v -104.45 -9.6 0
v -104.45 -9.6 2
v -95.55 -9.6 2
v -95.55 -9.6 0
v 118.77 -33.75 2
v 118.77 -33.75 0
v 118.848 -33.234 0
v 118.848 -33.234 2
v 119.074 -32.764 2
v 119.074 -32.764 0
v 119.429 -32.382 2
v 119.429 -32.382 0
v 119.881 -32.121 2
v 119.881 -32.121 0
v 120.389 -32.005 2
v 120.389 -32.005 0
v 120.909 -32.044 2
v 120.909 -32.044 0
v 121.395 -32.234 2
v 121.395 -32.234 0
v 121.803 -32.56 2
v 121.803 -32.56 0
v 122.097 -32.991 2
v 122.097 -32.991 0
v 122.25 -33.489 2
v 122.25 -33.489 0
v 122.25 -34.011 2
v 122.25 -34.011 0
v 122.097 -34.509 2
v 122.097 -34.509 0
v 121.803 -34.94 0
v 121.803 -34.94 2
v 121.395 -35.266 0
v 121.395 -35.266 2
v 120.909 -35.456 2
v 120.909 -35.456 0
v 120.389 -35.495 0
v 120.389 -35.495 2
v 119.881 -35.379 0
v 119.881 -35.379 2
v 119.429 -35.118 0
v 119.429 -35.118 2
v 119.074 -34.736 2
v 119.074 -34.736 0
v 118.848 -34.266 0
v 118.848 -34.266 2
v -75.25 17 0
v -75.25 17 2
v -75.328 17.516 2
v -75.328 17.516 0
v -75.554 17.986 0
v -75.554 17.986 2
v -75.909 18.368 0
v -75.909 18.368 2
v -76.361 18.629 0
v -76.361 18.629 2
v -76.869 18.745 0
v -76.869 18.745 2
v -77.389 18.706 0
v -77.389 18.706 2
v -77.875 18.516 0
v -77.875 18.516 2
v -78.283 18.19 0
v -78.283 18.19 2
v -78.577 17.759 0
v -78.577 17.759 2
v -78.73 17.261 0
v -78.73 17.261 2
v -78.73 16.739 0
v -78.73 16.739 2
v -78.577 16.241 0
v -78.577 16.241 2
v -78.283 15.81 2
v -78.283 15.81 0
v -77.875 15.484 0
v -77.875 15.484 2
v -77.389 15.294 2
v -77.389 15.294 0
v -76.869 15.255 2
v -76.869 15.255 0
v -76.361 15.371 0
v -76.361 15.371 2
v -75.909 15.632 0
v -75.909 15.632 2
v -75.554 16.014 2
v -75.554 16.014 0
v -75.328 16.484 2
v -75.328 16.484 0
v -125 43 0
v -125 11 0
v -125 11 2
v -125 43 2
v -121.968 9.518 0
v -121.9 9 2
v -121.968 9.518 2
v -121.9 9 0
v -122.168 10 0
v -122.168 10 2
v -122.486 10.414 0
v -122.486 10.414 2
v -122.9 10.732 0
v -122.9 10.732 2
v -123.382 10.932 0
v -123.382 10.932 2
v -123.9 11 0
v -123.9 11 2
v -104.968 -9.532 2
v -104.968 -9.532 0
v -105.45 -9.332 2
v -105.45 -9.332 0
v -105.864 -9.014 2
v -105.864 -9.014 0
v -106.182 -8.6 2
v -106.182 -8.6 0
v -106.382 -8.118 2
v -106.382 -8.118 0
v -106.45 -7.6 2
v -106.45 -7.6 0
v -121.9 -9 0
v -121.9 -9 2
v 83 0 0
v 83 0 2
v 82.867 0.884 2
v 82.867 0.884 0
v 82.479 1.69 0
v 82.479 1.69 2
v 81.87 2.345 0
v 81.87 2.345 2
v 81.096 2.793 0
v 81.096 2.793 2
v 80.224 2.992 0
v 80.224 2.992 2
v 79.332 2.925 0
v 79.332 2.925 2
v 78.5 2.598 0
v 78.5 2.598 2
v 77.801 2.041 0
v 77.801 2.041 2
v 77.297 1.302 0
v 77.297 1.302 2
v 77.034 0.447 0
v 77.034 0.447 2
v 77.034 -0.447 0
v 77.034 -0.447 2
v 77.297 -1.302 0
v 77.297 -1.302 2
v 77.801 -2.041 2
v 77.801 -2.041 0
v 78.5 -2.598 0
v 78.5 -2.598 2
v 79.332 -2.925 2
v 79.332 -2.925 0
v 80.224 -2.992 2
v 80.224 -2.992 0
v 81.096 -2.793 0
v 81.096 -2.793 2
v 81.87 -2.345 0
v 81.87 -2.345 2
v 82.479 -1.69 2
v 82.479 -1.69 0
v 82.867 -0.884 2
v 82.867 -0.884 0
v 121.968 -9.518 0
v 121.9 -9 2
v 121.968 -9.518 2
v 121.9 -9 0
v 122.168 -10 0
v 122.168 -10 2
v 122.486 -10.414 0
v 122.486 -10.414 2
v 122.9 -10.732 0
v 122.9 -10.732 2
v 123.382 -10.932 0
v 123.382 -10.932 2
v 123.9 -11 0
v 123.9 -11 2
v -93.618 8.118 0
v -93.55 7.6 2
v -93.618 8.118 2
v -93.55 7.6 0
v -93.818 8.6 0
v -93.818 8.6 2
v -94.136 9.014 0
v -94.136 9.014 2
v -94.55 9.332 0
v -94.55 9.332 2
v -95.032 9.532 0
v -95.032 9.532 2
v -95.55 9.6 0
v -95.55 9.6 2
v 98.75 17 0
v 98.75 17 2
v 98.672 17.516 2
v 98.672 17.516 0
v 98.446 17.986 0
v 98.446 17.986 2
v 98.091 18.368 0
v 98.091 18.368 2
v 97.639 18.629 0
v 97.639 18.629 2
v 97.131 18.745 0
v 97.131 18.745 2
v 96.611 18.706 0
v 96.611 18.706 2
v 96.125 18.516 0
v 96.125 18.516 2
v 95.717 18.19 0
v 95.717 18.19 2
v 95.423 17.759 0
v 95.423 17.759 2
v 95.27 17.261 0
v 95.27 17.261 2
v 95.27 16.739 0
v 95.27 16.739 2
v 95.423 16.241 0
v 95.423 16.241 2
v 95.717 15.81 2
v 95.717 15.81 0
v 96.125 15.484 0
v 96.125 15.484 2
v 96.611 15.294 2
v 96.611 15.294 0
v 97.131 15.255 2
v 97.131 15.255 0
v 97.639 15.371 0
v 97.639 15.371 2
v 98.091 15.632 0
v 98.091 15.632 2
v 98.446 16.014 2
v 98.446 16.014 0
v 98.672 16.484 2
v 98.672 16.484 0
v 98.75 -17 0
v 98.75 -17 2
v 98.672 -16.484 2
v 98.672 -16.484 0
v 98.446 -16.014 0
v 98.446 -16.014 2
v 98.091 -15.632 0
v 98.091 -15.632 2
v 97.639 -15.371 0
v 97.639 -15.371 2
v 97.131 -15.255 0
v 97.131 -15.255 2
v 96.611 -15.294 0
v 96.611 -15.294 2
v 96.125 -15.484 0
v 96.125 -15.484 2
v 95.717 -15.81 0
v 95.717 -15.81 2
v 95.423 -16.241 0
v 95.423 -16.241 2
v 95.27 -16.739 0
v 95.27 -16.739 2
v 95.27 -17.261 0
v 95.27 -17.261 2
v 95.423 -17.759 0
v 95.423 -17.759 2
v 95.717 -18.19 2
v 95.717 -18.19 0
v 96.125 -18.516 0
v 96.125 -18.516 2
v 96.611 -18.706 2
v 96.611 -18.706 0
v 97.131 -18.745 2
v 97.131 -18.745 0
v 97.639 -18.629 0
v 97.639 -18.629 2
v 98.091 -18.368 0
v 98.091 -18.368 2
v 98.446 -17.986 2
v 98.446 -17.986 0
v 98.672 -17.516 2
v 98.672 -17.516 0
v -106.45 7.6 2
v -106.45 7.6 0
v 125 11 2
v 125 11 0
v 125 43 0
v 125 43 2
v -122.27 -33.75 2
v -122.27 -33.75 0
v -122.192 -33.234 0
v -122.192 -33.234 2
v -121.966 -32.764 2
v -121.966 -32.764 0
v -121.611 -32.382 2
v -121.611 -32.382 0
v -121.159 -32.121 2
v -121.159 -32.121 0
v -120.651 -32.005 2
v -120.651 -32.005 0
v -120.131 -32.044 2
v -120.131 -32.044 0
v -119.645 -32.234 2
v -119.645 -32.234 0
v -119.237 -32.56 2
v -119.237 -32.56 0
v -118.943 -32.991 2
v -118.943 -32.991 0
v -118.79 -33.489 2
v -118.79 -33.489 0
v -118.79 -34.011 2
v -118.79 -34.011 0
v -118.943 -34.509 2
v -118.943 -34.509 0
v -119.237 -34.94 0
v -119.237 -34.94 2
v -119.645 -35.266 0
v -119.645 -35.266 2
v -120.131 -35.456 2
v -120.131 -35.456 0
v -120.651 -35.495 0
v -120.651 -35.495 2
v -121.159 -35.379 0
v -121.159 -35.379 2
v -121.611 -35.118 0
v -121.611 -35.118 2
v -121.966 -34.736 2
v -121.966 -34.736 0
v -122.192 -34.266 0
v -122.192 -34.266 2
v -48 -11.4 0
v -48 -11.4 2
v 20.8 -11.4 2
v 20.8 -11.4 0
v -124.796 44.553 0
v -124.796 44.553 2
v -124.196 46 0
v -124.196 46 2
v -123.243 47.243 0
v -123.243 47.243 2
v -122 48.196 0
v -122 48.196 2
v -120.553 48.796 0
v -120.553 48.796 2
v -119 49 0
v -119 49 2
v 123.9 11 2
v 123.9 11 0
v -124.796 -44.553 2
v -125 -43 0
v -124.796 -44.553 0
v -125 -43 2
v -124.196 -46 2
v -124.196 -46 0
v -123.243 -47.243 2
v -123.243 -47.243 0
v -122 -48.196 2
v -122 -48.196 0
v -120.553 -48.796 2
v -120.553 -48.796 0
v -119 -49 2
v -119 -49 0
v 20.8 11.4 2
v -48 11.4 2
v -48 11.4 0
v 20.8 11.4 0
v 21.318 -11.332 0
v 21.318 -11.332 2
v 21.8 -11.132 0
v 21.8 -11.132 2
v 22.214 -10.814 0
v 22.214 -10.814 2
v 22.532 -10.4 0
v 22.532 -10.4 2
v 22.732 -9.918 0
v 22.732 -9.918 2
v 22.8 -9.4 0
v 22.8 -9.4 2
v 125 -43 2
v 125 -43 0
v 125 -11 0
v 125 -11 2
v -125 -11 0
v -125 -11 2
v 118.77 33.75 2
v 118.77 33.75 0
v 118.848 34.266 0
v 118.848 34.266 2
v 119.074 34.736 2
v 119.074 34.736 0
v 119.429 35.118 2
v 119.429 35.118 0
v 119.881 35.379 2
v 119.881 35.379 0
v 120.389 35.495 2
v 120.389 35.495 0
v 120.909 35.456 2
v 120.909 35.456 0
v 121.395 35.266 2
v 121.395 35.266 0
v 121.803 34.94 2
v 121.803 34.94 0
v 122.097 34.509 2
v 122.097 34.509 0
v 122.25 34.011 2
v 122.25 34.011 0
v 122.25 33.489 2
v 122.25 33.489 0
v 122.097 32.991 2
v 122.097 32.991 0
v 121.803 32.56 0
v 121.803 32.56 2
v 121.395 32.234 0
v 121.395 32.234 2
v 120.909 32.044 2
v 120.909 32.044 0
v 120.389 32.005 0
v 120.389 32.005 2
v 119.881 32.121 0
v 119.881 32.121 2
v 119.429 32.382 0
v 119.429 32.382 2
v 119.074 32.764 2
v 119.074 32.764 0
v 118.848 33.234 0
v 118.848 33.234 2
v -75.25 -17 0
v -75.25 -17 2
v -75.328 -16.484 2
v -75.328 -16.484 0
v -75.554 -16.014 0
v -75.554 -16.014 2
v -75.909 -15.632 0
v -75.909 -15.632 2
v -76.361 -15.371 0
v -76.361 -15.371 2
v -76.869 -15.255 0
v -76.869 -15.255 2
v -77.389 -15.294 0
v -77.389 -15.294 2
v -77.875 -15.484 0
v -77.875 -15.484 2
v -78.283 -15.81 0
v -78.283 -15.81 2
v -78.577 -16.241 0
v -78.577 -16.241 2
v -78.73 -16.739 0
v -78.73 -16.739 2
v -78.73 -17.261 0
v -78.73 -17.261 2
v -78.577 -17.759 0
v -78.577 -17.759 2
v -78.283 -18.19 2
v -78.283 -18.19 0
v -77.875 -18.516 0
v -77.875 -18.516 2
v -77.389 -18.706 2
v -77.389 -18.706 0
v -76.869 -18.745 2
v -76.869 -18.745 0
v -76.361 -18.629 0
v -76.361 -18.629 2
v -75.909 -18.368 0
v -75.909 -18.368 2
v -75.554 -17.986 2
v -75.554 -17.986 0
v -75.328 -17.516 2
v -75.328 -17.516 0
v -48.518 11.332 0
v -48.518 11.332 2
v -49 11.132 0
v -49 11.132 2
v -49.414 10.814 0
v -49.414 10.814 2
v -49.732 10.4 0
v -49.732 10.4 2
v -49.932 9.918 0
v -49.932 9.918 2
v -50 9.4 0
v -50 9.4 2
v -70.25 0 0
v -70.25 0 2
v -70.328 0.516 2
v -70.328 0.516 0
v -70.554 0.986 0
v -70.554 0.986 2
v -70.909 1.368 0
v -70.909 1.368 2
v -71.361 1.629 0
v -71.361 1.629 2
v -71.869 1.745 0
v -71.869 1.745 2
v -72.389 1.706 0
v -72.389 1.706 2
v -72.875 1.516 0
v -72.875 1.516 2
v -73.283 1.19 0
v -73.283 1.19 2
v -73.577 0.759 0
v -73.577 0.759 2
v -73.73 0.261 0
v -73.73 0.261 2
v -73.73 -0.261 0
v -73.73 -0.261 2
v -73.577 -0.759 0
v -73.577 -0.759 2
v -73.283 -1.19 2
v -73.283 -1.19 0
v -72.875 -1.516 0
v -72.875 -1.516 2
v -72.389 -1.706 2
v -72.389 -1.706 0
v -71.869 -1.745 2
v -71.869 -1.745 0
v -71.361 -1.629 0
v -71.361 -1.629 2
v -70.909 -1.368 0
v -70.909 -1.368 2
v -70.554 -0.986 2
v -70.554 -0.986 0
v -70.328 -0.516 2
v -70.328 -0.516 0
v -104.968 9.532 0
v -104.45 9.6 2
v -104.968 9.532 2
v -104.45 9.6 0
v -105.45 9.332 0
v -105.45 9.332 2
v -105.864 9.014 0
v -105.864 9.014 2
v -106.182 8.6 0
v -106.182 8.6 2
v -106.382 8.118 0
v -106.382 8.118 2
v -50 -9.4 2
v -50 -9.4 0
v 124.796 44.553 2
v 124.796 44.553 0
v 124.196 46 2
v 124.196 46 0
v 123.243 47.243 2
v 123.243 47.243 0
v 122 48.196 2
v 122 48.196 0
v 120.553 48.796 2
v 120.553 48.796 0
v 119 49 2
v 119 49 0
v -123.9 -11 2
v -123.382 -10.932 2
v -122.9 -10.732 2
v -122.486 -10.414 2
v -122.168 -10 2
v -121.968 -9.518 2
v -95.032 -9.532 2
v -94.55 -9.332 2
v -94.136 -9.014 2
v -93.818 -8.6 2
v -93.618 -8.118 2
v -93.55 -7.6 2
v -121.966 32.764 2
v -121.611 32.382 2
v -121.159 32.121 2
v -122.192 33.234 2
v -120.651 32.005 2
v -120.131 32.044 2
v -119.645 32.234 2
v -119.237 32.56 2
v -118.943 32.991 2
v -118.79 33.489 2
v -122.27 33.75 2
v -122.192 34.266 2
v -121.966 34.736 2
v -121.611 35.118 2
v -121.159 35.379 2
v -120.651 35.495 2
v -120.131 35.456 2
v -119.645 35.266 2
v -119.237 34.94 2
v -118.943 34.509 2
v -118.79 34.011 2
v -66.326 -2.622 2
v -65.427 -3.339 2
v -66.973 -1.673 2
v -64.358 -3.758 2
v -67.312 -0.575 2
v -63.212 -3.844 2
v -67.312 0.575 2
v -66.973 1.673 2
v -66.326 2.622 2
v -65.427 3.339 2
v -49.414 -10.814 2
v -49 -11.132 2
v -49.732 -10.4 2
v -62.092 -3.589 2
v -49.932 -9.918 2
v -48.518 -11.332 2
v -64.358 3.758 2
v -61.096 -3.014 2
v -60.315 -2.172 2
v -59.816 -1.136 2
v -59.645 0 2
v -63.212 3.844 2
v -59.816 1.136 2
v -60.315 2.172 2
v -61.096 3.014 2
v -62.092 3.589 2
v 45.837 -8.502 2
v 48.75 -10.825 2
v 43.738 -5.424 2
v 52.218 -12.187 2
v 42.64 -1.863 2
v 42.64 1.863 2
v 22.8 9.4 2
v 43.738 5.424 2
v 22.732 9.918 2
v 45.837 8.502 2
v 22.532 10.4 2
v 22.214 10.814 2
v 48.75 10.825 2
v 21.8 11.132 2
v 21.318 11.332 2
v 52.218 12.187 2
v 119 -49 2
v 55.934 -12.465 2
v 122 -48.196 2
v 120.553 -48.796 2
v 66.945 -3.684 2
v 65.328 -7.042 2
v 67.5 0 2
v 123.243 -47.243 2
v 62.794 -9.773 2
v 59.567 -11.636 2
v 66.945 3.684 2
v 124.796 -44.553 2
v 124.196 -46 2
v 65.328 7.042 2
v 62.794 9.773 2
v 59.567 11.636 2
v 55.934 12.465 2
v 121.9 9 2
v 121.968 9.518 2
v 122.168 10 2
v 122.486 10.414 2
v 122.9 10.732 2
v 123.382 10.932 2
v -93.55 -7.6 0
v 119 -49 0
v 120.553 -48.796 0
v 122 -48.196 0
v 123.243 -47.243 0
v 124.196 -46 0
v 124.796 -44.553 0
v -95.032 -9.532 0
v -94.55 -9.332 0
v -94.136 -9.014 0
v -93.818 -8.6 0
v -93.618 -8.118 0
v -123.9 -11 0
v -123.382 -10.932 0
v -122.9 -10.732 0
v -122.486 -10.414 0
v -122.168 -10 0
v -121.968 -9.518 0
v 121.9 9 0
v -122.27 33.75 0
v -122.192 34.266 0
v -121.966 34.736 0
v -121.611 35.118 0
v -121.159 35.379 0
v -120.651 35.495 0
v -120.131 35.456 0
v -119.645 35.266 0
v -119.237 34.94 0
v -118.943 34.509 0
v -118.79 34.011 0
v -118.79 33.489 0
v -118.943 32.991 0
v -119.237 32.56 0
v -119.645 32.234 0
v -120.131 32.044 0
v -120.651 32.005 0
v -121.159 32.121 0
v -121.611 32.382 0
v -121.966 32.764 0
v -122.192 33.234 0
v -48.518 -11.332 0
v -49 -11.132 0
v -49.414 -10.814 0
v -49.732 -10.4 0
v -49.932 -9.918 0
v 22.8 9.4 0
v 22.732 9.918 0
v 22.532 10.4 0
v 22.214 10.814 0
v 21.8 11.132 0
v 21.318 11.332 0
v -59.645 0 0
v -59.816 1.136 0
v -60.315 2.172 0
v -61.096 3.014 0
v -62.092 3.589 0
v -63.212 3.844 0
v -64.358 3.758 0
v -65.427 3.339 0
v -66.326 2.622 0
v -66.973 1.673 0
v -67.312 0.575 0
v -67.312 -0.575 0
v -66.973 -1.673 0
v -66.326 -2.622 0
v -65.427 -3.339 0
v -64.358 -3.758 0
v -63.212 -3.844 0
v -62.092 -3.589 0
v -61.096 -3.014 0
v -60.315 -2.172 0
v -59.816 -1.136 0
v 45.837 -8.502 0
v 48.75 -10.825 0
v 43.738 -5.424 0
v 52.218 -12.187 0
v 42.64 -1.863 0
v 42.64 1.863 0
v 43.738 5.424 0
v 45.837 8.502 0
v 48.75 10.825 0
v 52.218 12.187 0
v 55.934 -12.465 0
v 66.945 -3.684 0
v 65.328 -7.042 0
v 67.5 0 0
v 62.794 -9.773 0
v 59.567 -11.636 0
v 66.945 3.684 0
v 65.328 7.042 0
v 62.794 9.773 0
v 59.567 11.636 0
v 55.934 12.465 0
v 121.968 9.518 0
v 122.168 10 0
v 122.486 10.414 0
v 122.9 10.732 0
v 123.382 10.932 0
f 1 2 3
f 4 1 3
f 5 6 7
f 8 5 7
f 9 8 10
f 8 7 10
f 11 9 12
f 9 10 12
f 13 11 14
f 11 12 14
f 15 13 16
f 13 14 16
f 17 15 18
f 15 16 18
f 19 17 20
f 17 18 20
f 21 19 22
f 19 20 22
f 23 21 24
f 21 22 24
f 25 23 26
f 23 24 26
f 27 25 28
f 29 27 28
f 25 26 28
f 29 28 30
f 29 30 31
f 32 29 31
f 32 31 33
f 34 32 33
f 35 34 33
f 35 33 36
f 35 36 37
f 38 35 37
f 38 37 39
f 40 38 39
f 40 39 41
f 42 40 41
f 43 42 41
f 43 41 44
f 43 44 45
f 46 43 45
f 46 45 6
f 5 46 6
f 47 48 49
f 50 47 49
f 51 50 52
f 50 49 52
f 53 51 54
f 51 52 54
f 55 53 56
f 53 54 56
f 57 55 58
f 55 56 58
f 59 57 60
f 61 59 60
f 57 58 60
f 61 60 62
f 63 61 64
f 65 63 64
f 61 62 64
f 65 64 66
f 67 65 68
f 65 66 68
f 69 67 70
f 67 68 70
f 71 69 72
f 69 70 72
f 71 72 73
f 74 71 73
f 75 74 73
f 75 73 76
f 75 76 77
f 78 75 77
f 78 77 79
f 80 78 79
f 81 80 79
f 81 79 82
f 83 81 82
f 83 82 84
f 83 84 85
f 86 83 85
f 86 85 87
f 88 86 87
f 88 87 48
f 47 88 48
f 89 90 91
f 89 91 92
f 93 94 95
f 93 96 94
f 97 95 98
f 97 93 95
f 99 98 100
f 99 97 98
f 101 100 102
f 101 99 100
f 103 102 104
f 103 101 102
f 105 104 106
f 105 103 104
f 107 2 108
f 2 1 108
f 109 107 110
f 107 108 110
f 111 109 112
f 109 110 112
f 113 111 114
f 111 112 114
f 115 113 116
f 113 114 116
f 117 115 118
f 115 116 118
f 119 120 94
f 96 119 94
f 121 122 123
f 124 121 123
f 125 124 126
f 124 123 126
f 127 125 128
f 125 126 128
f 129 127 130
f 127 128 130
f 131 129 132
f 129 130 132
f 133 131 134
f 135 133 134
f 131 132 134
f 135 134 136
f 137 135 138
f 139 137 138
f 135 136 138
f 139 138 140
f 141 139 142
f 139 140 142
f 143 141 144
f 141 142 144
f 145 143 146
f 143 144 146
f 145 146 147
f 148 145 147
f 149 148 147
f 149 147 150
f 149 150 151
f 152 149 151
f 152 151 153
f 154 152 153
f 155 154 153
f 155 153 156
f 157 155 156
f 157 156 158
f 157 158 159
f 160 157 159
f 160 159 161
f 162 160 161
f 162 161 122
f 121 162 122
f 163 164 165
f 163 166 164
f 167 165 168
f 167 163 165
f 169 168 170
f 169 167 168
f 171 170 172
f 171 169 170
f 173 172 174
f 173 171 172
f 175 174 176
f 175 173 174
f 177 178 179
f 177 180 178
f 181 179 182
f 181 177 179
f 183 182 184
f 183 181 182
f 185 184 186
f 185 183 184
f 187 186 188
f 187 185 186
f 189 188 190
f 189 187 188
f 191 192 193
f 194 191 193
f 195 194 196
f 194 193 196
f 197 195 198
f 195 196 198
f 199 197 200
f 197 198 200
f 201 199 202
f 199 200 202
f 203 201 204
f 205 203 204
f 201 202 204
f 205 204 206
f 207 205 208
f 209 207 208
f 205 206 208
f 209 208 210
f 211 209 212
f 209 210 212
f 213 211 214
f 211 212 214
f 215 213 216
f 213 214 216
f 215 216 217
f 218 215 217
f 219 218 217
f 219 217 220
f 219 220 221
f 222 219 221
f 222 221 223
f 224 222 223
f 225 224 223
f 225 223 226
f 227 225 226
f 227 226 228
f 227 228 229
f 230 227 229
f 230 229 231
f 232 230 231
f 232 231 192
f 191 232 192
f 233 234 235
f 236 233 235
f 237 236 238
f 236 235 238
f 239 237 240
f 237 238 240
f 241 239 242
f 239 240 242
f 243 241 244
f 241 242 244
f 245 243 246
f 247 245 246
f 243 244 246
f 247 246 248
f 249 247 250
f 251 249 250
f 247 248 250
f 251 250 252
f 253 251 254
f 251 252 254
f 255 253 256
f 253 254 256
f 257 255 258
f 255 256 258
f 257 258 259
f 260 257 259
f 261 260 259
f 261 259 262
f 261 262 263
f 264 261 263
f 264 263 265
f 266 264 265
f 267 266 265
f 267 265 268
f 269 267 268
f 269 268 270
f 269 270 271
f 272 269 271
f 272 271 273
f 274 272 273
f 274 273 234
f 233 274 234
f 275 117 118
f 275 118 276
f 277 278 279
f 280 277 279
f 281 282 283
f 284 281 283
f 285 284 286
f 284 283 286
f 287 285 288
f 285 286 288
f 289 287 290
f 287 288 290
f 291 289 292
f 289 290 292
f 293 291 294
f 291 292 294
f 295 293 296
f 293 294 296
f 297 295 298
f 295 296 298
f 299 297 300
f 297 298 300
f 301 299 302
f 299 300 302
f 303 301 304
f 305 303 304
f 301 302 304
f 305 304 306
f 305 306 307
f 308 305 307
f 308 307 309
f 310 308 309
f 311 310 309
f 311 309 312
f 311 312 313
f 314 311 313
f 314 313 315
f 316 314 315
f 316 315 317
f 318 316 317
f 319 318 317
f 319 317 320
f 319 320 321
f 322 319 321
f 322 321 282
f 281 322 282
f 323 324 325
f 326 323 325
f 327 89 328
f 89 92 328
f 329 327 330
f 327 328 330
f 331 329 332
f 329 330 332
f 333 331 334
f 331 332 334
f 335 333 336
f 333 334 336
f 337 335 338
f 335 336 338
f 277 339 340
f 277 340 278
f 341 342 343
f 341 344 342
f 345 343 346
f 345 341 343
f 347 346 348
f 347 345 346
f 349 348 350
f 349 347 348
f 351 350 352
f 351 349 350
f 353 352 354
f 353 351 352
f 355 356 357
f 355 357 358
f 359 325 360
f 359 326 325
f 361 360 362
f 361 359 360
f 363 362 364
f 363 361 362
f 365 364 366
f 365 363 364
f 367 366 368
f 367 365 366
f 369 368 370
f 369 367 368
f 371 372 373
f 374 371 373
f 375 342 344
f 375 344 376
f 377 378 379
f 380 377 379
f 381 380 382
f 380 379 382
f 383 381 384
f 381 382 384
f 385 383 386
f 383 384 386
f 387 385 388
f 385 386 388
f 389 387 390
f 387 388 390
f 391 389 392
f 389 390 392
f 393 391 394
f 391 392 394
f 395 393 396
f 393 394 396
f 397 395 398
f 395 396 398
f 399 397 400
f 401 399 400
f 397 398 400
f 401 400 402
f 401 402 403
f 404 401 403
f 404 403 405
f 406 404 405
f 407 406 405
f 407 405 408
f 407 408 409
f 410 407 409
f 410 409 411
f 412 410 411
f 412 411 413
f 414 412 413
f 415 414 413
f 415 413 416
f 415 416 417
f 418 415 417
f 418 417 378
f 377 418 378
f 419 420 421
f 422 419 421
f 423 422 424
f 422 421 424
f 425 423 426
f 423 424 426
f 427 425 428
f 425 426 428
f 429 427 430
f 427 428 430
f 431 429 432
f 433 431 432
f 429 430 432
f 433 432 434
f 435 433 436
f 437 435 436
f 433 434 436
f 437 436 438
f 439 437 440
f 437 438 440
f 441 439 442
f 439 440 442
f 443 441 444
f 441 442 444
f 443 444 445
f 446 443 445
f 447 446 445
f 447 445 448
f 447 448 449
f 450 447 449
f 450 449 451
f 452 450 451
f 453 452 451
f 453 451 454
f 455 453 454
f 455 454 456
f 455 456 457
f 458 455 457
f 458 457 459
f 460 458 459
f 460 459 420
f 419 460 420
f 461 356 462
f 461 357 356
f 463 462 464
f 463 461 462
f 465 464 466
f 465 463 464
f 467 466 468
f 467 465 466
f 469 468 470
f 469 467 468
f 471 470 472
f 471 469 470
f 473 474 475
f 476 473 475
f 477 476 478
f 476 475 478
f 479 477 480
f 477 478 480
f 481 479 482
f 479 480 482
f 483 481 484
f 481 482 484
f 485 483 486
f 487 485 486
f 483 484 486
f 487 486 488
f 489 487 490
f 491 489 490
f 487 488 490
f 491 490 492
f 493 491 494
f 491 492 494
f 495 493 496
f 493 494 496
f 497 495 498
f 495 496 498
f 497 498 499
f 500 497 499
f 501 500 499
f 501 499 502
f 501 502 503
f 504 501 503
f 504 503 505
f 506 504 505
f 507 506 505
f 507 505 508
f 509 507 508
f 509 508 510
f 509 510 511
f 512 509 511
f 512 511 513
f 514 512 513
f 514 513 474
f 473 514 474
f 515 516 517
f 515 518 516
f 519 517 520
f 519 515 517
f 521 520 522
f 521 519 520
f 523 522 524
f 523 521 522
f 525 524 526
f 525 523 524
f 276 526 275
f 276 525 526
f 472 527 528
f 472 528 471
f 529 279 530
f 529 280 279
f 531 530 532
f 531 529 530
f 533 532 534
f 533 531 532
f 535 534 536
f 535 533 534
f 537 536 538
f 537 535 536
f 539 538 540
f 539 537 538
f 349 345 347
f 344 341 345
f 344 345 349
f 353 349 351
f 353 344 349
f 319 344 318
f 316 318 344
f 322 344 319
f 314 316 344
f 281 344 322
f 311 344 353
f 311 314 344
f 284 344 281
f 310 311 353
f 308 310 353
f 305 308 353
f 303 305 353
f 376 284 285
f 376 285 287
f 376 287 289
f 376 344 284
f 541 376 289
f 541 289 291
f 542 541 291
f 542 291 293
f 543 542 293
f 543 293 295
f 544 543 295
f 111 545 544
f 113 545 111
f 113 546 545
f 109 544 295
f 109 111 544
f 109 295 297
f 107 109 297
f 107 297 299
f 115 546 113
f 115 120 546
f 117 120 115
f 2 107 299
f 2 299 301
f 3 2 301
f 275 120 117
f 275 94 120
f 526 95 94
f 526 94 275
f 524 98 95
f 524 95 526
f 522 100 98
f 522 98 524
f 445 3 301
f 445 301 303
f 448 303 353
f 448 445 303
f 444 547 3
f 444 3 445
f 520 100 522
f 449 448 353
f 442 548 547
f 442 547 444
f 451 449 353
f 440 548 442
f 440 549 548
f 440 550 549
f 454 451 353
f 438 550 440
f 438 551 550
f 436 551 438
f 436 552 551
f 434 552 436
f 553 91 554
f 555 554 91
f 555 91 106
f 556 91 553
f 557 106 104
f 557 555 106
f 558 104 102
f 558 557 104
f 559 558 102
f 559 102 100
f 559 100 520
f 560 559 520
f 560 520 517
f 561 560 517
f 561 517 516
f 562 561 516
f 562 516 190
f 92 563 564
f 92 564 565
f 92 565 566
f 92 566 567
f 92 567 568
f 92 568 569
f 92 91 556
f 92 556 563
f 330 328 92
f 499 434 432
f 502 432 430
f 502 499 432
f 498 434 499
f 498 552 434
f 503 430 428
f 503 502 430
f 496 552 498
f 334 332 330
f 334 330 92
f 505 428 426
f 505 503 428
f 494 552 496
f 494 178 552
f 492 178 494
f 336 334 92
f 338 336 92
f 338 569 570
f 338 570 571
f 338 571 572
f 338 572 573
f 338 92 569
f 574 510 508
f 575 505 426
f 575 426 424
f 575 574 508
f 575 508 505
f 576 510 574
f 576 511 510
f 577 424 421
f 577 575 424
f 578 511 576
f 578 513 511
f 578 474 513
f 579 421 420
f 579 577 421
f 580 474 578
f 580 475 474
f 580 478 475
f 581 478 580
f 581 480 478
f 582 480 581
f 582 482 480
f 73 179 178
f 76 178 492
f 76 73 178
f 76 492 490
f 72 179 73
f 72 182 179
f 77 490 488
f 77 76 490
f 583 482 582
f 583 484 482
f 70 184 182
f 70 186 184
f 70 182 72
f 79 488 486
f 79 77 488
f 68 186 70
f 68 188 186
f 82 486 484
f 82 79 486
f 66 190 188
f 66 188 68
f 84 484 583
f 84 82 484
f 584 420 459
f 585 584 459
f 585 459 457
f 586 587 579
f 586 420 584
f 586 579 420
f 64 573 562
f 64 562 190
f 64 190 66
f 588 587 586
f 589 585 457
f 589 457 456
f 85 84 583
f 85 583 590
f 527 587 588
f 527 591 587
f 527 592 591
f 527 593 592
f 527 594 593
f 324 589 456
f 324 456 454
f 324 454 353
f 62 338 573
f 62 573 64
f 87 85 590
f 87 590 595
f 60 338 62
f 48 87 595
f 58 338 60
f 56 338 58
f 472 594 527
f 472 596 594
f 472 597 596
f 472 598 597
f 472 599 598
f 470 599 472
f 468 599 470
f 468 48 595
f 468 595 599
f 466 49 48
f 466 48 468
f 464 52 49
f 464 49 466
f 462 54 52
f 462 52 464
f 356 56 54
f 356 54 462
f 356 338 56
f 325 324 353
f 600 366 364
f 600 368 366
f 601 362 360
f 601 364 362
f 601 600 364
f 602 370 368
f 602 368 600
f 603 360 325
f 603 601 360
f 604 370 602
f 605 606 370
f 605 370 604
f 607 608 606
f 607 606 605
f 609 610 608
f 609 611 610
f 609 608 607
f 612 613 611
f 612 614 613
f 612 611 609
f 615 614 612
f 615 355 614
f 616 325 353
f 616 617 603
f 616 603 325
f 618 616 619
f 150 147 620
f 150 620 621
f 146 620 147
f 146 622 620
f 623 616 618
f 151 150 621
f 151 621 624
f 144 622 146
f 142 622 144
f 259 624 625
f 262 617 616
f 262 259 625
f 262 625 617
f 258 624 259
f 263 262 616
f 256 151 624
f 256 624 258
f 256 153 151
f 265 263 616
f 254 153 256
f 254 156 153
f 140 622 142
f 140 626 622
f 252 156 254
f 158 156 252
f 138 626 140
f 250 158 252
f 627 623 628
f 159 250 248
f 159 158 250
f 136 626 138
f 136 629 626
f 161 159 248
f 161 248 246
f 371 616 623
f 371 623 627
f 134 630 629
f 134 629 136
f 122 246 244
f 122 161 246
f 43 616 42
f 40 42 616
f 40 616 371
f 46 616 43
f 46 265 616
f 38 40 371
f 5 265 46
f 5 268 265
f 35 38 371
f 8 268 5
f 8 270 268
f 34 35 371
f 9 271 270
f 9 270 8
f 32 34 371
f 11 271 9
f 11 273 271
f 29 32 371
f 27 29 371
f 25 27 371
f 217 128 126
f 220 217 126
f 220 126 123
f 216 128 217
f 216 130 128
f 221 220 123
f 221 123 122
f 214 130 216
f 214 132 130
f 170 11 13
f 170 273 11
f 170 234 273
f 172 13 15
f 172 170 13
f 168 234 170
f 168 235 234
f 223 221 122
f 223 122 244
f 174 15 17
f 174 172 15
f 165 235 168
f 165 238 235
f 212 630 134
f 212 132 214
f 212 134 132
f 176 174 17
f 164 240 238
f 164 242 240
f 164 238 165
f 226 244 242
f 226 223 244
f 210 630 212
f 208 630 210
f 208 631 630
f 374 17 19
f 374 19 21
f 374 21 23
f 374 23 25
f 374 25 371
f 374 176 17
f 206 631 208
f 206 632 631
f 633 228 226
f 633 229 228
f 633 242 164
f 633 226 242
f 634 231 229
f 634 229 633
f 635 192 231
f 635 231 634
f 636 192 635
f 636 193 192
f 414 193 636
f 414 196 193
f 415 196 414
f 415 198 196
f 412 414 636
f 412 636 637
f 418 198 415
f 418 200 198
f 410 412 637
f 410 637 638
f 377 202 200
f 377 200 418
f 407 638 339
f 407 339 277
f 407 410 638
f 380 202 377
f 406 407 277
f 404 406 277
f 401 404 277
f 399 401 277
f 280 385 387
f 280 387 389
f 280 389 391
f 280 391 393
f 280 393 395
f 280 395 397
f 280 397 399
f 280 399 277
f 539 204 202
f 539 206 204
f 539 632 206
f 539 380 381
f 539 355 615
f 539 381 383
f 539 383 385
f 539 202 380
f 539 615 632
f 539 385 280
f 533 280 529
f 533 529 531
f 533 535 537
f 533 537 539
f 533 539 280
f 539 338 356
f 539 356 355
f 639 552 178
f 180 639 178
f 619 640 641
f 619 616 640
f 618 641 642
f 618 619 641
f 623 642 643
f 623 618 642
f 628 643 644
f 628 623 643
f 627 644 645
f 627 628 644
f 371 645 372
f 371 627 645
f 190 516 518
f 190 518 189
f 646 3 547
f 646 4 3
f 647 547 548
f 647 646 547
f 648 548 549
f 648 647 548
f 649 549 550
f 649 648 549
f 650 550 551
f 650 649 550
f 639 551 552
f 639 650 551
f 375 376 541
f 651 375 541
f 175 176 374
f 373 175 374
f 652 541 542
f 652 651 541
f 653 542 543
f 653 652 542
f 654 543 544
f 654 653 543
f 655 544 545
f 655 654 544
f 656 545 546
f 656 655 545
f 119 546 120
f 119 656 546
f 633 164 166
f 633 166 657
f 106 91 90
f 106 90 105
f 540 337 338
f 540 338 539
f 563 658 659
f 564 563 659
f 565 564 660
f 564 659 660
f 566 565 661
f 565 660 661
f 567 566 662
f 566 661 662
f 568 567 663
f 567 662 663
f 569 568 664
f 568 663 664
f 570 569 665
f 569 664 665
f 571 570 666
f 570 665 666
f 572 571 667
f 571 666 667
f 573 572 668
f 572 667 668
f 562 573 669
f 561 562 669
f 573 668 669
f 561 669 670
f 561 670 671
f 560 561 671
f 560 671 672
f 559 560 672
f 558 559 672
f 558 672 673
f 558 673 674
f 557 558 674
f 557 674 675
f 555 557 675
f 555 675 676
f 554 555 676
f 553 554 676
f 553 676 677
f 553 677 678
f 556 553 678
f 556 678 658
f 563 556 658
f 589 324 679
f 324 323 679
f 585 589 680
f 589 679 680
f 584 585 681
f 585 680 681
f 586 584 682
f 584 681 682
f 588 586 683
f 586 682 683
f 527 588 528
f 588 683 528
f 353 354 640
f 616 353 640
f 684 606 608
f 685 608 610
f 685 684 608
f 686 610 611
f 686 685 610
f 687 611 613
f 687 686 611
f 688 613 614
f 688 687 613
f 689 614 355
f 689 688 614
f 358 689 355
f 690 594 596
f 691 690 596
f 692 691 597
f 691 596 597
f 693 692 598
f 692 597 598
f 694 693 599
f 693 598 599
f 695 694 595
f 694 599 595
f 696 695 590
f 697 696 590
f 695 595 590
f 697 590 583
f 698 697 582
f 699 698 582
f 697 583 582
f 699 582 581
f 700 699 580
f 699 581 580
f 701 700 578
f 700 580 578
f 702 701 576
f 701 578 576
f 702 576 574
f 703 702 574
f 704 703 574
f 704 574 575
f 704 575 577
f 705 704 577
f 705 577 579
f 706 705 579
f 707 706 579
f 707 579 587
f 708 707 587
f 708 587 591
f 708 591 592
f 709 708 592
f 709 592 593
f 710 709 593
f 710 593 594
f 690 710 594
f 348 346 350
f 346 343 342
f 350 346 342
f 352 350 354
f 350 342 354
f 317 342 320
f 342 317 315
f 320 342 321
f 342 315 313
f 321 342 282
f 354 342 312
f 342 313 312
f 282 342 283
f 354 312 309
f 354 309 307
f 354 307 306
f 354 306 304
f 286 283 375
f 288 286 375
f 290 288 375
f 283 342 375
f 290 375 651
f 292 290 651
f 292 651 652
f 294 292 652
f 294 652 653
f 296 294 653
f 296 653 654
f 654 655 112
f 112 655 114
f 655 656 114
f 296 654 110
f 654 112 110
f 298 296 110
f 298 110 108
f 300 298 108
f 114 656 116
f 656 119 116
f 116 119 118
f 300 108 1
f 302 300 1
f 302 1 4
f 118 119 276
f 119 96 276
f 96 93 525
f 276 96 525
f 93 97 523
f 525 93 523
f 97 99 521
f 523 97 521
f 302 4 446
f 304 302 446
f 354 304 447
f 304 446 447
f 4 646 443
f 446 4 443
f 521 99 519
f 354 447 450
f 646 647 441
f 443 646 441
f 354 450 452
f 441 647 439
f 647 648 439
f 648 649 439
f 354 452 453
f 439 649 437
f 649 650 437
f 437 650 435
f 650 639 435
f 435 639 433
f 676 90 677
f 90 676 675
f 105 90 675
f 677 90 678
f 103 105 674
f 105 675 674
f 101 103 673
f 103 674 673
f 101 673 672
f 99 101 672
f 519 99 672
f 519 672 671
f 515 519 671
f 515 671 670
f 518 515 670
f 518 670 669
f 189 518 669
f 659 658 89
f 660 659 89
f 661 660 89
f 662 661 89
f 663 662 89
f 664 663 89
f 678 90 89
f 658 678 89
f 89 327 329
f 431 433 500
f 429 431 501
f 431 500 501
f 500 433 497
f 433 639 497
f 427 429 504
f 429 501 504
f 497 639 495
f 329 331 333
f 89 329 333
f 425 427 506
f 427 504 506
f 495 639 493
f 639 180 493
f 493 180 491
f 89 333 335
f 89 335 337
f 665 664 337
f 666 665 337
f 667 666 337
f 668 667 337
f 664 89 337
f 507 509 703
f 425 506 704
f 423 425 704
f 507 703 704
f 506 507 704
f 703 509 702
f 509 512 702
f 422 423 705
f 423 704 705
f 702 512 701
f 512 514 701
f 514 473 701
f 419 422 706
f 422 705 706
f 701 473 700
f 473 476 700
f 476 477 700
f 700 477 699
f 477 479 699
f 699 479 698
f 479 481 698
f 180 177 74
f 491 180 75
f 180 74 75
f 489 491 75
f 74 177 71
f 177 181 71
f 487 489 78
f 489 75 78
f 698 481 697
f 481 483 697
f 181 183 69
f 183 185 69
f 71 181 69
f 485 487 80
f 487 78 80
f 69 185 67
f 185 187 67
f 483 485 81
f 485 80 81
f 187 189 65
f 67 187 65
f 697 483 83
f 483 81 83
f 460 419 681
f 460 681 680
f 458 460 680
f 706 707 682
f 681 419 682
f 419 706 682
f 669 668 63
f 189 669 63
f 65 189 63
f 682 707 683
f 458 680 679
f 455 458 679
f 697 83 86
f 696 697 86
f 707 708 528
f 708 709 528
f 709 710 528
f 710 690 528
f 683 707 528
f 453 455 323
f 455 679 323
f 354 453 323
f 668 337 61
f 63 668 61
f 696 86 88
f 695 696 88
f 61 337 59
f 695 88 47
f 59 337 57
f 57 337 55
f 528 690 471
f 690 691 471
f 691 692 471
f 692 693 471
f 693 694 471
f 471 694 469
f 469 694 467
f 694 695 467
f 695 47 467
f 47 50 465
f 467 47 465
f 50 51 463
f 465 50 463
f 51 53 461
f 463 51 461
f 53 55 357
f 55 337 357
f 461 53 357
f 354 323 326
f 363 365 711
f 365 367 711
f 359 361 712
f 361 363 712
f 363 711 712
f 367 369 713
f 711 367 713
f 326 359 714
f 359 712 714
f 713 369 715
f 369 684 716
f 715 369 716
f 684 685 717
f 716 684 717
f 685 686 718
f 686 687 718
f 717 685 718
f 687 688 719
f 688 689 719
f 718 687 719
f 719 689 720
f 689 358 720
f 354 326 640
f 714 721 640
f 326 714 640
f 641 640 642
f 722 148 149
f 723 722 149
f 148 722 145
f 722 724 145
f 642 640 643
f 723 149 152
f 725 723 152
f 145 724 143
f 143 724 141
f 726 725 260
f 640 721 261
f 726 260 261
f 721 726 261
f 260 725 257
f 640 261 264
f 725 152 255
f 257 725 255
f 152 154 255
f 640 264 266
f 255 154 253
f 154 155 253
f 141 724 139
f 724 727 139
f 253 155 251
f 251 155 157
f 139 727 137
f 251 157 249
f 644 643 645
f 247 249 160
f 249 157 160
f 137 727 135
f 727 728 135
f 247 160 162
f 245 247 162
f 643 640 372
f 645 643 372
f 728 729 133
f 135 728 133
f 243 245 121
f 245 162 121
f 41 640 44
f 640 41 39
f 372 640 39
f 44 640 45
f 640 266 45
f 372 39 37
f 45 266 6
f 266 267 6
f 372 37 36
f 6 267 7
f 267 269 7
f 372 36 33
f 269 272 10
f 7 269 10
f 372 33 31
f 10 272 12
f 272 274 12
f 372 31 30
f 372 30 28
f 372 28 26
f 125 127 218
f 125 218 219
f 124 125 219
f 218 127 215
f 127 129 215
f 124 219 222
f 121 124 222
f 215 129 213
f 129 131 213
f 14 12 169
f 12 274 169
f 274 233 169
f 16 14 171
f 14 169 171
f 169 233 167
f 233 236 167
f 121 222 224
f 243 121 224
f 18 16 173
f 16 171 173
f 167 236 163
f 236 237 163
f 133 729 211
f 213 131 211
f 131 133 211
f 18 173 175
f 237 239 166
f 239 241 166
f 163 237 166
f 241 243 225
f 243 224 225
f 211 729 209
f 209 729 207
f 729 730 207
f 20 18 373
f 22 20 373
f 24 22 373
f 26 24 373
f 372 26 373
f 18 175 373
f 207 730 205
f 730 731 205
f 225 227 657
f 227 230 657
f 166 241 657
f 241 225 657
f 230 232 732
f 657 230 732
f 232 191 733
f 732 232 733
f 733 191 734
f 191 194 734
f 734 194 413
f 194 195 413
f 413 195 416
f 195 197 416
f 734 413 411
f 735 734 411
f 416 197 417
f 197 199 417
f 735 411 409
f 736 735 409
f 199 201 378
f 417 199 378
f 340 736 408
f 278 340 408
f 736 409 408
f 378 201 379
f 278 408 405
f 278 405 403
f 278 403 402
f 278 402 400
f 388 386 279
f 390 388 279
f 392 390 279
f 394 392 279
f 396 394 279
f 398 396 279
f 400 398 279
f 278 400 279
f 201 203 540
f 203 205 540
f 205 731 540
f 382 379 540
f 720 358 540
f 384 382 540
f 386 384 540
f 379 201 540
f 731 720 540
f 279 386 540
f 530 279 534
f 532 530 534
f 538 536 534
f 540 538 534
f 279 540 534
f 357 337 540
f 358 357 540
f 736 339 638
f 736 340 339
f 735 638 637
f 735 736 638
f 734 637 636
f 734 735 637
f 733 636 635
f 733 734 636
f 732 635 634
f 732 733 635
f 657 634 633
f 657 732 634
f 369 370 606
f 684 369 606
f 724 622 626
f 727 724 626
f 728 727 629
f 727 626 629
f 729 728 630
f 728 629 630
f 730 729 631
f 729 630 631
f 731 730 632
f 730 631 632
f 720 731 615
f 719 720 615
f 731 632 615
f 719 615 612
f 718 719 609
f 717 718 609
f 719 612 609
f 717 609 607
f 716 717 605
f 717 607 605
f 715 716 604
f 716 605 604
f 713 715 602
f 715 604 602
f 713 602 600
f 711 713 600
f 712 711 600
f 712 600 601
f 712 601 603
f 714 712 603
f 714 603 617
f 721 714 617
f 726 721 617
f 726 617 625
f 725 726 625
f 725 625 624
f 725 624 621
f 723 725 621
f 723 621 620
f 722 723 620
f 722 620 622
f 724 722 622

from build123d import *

# Parameters (mm, degrees)
SKETCH1_W                  = 250
SKETCH1_H                  = 98
BOSS_EXTRUDE1_DEPTH        = 2
FILLET1_R                  = 6
SKETCH2_W                  = 6.2
SKETCH2_H                  = 22
CUT_EXTRUDE1_DEPTH         = 12
FILLET2_R                  = 2
F_3_5_3_5_DIAMETER_HOLE1_D = 3.5
SKETCH6_R                  = 1.75
SKETCH6_R_2                = 3.855
SKETCH6_R_3                = 12.5
SKETCH6_R_4                = 3
SKETCH6_W                  = 72.8
SKETCH6_H                  = 22.8
SKETCH6_W_2                = 12.9
SKETCH6_H_2                = 19.2
CUT_EXTRUDE2_DEPTH         = 12
FILLET3_R                  = 2


with BuildPart() as part:
    # Sketch1 → Boss-Extrude1 (new body)
    with BuildSketch(Plane.XY):
        Rectangle(SKETCH1_W, SKETCH1_H)
    extrude(amount=BOSS_EXTRUDE1_DEPTH)

    # Fillet1
    fillet1_edges = [part.edges().sort_by_distance(p)[0] for p in [
        (-125, -49, 1),
        (125, -49, 1),
        (125, 49, 1),
        (-125, 49, 1),
    ]]
    fillet(fillet1_edges, radius=FILLET1_R)

    # Sketch2 → Cut-Extrude1 (cut)
    with BuildSketch(Plane.XY.offset(2)):
        with Locations((-125, 0)):
            Rectangle(SKETCH2_W, SKETCH2_H)
        with Locations((125, 0)):
            Rectangle(SKETCH2_W, SKETCH2_H)
    extrude(amount=-CUT_EXTRUDE1_DEPTH, mode=Mode.SUBTRACT)

    # Fillet2
    fillet2_edges = [part.edges().sort_by_distance(p)[0] for p in [
        (-121.9, 11, 1),
        (-121.9, -11, 1),
        (121.9, 11, 1),
        (121.9, -11, 1),
    ]]
    fillet(fillet2_edges, radius=FILLET2_R)

    # Ø3.5 (3.5) Diameter Hole1 (through all)
    with Locations(Plane.XY.offset(2)):
        with Locations((-120.52, 33.75), (-120.52, -33.75), (120.52, -33.75), (120.52, 33.75)):
            Hole(F_3_5_3_5_DIAMETER_HOLE1_D / 2)

    # Sketch6 → Cut-Extrude2 (cut)
    with BuildSketch(Plane.XY.offset(2)):
        with Locations((-77, 17)):
            Circle(SKETCH6_R)
        with Locations((-77, -17)):
            Circle(SKETCH6_R)
        with Locations((97, 17)):
            Circle(SKETCH6_R)
        with Locations((97, -17)):
            Circle(SKETCH6_R)
        with Locations((-72, 0)):
            Circle(SKETCH6_R)
        with Locations((-63.5, 0)):
            Circle(SKETCH6_R_2)
        with Locations((55, 0)):
            Circle(SKETCH6_R_3)
        with Locations((80, 0)):
            Circle(SKETCH6_R_4)
        with Locations((-13.6, 0)):
            Rectangle(SKETCH6_W, SKETCH6_H)
        with Locations((-100, 0)):
            Rectangle(SKETCH6_W_2, SKETCH6_H_2)
    extrude(amount=-CUT_EXTRUDE2_DEPTH, mode=Mode.SUBTRACT)

    # Fillet3
    fillet3_edges = [part.edges().sort_by_distance(p)[0] for p in [
        (22.8, 11.4, 1),
        (22.8, -11.4, 1),
        (-50, -11.4, 1),
        (-50, 11.4, 1),
        (-93.55, 9.6, 1),
        (-93.55, -9.6, 1),
        (-106.45, -9.6, 1),
        (-106.45, 9.6, 1),
    ]]
    fillet(fillet3_edges, radius=FILLET3_R)


solid = part.part
